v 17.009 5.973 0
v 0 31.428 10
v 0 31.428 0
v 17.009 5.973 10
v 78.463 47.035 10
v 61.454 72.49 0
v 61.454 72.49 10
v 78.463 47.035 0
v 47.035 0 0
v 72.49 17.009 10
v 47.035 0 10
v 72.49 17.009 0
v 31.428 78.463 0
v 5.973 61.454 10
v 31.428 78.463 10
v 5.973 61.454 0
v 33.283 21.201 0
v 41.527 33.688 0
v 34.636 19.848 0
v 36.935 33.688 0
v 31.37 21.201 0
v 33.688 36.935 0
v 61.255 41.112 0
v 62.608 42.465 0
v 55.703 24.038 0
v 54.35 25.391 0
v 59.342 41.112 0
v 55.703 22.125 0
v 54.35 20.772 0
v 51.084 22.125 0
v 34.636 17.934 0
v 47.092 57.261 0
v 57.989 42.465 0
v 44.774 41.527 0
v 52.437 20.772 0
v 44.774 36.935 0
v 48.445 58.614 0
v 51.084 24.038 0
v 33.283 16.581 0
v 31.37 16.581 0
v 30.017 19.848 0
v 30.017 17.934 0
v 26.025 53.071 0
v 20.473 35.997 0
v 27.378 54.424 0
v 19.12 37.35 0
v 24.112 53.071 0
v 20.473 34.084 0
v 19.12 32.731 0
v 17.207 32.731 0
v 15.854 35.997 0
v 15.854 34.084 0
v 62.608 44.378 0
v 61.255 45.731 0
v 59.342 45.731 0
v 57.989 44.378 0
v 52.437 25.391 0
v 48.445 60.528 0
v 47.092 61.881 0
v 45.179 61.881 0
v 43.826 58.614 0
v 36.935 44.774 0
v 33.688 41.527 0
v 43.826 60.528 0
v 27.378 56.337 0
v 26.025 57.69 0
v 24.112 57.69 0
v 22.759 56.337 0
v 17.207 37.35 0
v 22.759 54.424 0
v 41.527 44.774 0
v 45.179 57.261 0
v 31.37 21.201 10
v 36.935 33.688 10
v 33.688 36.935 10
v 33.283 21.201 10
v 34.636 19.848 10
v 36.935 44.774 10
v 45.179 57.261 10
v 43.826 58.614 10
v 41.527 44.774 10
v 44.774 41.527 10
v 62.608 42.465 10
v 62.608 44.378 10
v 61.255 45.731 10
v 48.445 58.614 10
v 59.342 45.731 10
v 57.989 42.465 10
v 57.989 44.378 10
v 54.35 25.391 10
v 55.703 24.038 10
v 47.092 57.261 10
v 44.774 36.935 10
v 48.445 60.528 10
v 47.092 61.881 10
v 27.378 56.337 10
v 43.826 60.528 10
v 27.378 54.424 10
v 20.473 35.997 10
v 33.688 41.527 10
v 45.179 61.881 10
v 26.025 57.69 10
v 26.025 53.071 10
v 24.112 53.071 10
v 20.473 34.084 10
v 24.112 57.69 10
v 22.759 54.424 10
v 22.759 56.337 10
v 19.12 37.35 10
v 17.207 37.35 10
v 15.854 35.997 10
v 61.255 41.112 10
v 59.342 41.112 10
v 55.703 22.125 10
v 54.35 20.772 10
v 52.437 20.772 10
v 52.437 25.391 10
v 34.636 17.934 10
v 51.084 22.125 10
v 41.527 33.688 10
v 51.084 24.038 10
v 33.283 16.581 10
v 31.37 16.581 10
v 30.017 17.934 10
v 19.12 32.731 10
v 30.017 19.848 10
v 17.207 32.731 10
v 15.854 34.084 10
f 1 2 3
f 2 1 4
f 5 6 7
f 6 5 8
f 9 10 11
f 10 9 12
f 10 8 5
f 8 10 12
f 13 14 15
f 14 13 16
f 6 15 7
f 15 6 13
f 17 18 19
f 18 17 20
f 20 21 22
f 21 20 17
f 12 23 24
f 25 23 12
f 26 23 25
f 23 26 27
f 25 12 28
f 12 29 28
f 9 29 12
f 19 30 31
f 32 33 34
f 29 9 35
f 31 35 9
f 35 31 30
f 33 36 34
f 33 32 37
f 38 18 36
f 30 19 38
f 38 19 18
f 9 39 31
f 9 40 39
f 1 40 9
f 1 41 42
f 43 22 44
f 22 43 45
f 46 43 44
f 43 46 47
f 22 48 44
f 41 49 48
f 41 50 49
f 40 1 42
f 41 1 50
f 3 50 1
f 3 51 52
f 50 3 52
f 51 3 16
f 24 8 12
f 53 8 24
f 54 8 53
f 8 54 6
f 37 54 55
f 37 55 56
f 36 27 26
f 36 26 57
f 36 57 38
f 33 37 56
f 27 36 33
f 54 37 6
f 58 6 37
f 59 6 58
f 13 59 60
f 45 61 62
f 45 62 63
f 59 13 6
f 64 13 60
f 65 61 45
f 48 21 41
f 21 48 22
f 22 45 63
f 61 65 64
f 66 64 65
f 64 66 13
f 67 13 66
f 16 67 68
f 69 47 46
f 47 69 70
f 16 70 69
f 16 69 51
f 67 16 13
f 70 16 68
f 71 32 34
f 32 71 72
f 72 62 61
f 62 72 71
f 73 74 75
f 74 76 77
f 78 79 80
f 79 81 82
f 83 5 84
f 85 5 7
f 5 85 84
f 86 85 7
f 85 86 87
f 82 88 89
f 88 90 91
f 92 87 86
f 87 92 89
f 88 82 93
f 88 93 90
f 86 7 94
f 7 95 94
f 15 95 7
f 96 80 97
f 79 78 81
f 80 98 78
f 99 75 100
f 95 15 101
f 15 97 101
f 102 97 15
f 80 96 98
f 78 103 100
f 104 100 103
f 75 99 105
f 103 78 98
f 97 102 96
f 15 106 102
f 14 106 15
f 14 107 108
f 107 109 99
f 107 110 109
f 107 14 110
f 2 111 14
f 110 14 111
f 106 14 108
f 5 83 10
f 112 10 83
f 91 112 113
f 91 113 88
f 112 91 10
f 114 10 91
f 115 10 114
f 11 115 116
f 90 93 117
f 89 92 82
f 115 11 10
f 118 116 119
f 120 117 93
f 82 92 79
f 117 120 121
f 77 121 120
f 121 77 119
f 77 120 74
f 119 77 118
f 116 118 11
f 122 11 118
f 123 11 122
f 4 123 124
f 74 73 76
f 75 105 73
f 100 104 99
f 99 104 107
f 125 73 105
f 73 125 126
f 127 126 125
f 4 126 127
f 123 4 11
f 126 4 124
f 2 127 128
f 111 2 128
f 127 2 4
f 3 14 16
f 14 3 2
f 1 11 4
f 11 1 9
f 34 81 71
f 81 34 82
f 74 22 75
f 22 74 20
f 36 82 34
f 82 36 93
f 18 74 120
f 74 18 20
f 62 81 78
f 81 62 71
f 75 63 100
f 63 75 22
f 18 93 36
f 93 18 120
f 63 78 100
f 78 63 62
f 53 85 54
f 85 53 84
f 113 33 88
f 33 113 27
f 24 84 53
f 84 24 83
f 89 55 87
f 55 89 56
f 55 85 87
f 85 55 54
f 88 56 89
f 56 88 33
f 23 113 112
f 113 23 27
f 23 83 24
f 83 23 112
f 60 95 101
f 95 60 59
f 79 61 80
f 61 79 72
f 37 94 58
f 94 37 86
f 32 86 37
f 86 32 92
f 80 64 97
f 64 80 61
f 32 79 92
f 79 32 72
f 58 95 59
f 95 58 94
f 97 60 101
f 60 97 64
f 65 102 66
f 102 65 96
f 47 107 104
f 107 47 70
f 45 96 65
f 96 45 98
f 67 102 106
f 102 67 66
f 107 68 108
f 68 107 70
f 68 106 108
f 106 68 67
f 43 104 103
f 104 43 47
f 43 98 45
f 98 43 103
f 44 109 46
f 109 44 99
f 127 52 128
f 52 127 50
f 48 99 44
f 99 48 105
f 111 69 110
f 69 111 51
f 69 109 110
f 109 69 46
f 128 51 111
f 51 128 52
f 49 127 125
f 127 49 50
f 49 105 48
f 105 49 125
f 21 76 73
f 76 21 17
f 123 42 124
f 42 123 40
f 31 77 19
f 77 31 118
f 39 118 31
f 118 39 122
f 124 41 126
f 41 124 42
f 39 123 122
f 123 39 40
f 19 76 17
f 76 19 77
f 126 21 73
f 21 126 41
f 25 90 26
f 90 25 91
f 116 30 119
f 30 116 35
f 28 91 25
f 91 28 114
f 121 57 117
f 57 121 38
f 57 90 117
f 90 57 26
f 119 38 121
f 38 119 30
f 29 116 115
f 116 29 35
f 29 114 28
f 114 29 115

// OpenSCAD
$fn = 32;

// ----------------------------------------------------------------------
// Polygon plate: 8-gon R40, 6 bolt windows
// ----------------------------------------------------------------------

// --- parameters (mm) ---
sides = 8;                // number of polygon sides
plate_r = 40;             // circumscribed radius of the polygon
bore_r = 6;               // centre bore radius
bolts = 6;                // number of bolt windows
ring_r = 21.48;           // bolt-circle radius
bolt_r = 2.5;             // bolt window radius
plate_t = 10;             // plate thickness, Z (extrusion height)
fit_tol = 0.02;           // declared fit tolerance (prompt contract)
free_tol = 0.2;           // declared free tolerance (prompt contract)

plate_d = 2 * plate_r;  // circumscribed diameter
bore_d = 2 * bore_r;  // centre bore diameter
bolt_d = 2 * bolt_r;  // bolt window diameter
ring_d = 2 * ring_r;  // bolt-circle diameter

profile = [[78.463, 47.035], [61.454, 72.49], [31.428, 78.463], [5.973, 61.454], [0, 31.428], [17.009, 5.973], [47.035, 0], [72.49, 17.009]];  // primary outline, 8 points, counter clockwise
void_1 = [[44.774, 41.527], [41.527, 44.774], [36.935, 44.774], [33.688, 41.527], [33.688, 36.935], [36.935, 33.688], [41.527, 33.688], [44.774, 36.935]];  // centre bore, 8 points
void_2 = [[62.608, 44.378], [61.255, 45.731], [59.342, 45.731], [57.989, 44.378], [57.989, 42.465], [59.342, 41.112], [61.255, 41.112], [62.608, 42.465]];  // bolt window 1, 8 points
void_3 = [[48.445, 60.528], [47.092, 61.881], [45.179, 61.881], [43.826, 60.528], [43.826, 58.614], [45.179, 57.261], [47.092, 57.261], [48.445, 58.614]];  // bolt window 2, 8 points
void_4 = [[27.378, 56.337], [26.025, 57.69], [24.112, 57.69], [22.759, 56.337], [22.759, 54.424], [24.112, 53.071], [26.025, 53.071], [27.378, 54.424]];  // bolt window 3, 8 points
void_5 = [[20.473, 35.997], [19.12, 37.35], [17.207, 37.35], [15.854, 35.997], [15.854, 34.084], [17.207, 32.731], [19.12, 32.731], [20.473, 34.084]];  // bolt window 4, 8 points
void_6 = [[34.636, 19.848], [33.283, 21.201], [31.37, 21.201], [30.017, 19.848], [30.017, 17.934], [31.37, 16.581], [33.283, 16.581], [34.636, 17.934]];  // bolt window 5, 8 points
void_7 = [[55.703, 24.038], [54.35, 25.391], [52.437, 25.391], [51.084, 24.038], [51.084, 22.125], [52.437, 20.772], [54.35, 20.772], [55.703, 22.125]];  // bolt window 6, 8 points

// --- the one profile operation ---
difference() {
  linear_extrude(height = plate_t) polygon(points = profile);
  translate([0, 0, -1])
    linear_extrude(height = plate_t + 2) polygon(points = void_1);
  translate([0, 0, -1])
    linear_extrude(height = plate_t + 2) polygon(points = void_2);
  translate([0, 0, -1])
    linear_extrude(height = plate_t + 2) polygon(points = void_3);
  translate([0, 0, -1])
    linear_extrude(height = plate_t + 2) polygon(points = void_4);
  translate([0, 0, -1])
    linear_extrude(height = plate_t + 2) polygon(points = void_5);
  translate([0, 0, -1])
    linear_extrude(height = plate_t + 2) polygon(points = void_6);
  translate([0, 0, -1])
    linear_extrude(height = plate_t + 2) polygon(points = void_7);
}
